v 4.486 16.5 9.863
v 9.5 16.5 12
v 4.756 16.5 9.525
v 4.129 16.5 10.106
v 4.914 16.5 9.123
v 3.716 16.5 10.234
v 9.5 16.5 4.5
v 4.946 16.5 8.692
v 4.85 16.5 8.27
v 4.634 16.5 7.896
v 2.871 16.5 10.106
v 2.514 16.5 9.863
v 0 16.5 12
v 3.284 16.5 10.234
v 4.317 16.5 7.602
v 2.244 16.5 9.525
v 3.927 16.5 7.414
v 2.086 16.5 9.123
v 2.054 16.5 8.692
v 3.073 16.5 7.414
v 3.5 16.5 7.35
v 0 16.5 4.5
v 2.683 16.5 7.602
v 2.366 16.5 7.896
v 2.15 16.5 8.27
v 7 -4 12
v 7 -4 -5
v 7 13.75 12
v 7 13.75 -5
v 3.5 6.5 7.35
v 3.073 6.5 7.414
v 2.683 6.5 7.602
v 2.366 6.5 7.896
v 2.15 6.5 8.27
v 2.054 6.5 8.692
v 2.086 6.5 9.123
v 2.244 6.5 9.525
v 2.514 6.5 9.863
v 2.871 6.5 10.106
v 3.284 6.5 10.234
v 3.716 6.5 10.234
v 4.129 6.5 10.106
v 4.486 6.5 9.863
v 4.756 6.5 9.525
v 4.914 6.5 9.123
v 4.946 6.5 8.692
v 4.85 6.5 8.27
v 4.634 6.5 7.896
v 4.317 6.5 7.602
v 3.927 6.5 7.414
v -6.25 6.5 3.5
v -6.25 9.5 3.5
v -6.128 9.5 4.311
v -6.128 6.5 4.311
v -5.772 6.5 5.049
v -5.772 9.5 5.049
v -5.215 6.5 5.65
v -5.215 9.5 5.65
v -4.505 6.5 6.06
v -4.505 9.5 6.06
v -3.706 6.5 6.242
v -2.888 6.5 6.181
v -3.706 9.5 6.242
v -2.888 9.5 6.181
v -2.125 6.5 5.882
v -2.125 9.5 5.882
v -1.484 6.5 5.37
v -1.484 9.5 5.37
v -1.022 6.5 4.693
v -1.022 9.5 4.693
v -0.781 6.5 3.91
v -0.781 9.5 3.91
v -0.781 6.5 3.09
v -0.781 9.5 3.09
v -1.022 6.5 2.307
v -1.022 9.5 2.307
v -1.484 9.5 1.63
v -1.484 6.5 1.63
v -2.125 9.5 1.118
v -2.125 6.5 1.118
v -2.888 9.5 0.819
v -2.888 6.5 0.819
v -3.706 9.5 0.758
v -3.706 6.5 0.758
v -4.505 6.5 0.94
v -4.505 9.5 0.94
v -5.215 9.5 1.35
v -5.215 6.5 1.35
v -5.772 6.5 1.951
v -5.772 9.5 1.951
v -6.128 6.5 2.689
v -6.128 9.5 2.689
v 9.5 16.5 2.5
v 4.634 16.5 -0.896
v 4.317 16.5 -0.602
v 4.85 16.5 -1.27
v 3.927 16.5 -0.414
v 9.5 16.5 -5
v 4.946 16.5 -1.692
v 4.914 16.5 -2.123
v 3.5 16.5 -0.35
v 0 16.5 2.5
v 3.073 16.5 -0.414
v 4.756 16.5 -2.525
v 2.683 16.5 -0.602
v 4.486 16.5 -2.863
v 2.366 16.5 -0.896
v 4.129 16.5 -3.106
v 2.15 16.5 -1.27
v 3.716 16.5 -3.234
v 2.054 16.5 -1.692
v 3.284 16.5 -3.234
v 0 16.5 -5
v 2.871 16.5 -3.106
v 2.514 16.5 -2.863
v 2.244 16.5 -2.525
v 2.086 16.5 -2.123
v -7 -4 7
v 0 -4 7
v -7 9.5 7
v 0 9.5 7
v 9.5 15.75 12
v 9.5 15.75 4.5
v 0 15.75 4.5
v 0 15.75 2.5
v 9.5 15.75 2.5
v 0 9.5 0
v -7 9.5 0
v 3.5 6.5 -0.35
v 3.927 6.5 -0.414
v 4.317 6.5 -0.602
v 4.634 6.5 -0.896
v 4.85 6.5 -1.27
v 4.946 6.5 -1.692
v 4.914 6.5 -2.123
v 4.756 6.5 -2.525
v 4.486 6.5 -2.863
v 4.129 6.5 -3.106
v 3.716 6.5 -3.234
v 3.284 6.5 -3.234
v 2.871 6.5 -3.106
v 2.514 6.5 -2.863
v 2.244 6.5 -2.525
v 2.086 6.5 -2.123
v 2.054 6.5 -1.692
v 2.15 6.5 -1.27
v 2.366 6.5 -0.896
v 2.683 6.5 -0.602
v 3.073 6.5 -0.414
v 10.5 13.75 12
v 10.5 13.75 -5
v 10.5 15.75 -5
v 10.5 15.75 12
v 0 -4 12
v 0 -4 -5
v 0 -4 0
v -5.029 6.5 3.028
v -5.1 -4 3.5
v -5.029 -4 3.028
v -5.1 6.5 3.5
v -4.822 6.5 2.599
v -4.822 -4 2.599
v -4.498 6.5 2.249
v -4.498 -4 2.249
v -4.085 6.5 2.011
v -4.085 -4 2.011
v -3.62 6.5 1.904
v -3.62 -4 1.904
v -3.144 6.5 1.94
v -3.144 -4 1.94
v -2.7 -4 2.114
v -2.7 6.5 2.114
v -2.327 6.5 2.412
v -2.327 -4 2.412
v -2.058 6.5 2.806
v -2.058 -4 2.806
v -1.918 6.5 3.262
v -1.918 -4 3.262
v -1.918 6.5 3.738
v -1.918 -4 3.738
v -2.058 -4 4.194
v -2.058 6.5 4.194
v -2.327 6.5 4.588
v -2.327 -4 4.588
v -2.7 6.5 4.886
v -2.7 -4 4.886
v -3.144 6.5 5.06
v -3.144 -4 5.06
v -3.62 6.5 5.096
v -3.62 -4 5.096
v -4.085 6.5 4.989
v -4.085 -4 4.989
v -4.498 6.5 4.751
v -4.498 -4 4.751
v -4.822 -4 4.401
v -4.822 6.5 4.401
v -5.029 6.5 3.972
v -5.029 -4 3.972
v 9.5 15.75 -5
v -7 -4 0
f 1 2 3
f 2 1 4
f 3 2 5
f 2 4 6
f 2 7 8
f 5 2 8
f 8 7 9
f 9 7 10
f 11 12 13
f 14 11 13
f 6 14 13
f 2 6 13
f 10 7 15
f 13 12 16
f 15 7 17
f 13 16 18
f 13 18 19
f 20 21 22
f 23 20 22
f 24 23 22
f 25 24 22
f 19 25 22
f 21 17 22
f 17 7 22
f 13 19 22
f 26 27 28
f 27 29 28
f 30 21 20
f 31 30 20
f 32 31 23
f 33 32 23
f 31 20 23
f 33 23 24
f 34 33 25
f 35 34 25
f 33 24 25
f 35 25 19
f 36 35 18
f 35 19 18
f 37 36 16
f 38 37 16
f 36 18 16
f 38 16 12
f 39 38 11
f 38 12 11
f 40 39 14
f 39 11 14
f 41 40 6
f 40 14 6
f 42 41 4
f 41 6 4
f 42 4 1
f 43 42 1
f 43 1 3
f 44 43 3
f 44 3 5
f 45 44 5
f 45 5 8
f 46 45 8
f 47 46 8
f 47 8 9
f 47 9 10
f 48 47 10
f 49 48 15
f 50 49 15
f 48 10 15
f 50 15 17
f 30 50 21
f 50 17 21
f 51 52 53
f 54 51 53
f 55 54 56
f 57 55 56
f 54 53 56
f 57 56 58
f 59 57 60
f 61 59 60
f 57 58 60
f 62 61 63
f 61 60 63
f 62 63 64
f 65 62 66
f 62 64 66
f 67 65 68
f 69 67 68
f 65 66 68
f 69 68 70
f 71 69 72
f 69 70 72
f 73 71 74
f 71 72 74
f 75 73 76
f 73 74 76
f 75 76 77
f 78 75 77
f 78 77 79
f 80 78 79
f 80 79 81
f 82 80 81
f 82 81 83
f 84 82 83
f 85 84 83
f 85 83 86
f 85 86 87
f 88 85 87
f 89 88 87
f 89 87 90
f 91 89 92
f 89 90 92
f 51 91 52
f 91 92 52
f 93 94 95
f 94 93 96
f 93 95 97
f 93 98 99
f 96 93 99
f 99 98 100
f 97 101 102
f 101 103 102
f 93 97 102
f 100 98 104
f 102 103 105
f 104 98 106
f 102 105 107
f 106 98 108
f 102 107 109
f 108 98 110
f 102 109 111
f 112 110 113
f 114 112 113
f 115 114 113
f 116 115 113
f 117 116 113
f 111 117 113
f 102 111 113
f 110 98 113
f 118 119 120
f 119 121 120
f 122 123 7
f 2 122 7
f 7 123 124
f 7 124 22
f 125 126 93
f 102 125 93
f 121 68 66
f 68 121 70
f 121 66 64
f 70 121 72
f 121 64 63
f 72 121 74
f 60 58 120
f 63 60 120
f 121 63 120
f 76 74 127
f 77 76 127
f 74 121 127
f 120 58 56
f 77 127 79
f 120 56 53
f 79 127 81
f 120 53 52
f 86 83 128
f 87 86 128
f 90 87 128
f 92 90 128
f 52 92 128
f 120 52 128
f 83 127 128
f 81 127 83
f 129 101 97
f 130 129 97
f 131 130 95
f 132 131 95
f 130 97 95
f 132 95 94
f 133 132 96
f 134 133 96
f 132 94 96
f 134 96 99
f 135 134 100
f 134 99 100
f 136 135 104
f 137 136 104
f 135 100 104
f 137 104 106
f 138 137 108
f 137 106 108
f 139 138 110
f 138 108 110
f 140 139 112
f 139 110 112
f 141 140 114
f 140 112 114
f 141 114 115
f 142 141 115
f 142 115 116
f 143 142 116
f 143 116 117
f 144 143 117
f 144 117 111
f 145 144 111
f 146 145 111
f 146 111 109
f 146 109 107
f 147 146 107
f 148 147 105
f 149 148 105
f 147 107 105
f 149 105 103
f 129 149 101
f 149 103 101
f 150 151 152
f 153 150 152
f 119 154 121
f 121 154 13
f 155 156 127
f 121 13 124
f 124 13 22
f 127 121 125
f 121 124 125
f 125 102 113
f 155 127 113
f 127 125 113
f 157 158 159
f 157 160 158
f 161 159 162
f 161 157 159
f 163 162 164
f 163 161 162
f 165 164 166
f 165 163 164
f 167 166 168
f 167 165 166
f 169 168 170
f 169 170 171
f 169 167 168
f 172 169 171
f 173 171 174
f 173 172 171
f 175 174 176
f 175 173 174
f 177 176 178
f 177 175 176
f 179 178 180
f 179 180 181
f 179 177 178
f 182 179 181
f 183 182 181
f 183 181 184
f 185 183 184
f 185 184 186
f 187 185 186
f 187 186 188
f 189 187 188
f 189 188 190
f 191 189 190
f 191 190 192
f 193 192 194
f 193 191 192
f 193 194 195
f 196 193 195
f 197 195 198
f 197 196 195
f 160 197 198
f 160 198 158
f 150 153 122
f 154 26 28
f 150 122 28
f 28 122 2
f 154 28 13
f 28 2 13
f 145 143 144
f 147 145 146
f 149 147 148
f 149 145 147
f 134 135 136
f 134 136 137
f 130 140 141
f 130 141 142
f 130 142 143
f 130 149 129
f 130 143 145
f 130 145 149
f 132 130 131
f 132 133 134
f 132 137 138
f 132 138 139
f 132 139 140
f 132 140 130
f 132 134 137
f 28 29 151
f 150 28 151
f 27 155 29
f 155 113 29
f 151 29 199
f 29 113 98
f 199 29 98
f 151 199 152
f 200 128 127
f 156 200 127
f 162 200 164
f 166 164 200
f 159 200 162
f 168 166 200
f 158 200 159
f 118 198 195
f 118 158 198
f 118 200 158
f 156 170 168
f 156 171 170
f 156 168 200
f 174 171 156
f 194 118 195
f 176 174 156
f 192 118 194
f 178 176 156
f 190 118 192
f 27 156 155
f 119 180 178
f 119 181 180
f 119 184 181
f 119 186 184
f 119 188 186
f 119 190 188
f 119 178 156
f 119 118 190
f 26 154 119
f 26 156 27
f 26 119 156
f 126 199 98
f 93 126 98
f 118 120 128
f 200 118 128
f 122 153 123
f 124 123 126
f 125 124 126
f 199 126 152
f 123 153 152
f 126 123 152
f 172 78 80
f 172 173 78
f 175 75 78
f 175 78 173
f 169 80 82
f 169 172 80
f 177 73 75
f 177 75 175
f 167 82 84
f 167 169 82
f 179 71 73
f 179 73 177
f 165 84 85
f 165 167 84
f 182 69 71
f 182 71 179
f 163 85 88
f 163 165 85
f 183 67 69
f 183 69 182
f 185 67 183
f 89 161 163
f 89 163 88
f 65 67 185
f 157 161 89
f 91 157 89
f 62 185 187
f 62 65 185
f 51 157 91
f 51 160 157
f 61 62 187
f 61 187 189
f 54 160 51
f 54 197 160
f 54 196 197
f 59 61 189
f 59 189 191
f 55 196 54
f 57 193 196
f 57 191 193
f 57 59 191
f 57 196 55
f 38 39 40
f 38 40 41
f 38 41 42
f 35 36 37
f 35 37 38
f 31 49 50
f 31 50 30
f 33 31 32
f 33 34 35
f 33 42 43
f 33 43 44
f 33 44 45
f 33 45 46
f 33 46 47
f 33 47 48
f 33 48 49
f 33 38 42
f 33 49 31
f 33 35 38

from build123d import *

# Parameters (mm, degrees)
SALIENTE_EXTRUIR1_DEPTH      = 7
CROQUIS5_R                   = 1.6
CORTAR_EXTRUIR2_DEPTH        = 13.9
CROQUIS6_R                   = 2.75
CORTAR_EXTRUIR3_DEPTH        = 3
SALIENTE_EXTRUIR2_DEPTH      = 5
SALIENTE_EXTRUIR2_DEPTH_BACK = 12
CROQUIS8_R                   = 1.45
CORTAR_EXTRUIR4_DEPTH        = 10
CROQUIS9_W                   = 2
CROQUIS9_H                   = 0.75
CORTAR_EXTRUIR5_DEPTH        = 10
CROQUIS10_R                  = 1.6
SALIENTE_EXTRUIR3_DEPTH      = 4


with BuildPart() as part:
    # Croquis1 → Saliente-Extruir1 (new body)
    with BuildSketch(Plane.XY):
        Polygon((0, 0), (4, 0), (4, -4), (7, -4), (7, 0), (7, 13.75), (10.5, 13.75), (10.5, 15.75), (9.5, 15.75), (9.5, 16.5), (7, 16.5), (0, 16.5), (0, 9.5), (-7, 9.5), (-7, 0), align=None)
    extrude(amount=SALIENTE_EXTRUIR1_DEPTH)

    # Croquis5 → Cortar-Extruir2 (cut)
    with BuildSketch(Plane(origin=(0, 9.5, 0), x_dir=(1, 0, 0), z_dir=(0, 1, 0))):
        with Locations(Location((-3.5, -3.5, 0), (0, 0, 180))):
            Circle(CROQUIS5_R)
    extrude(amount=-CORTAR_EXTRUIR2_DEPTH, mode=Mode.SUBTRACT)

    # Croquis6 → Cortar-Extruir3 (cut)
    with BuildSketch(Plane(origin=(0, 9.5, 0), x_dir=(1, 0, 0), z_dir=(0, 1, 0))):
        with Locations(Location((-3.5, -3.5, 0), (0, 0, 180))):
            Circle(CROQUIS6_R)
    extrude(amount=-CORTAR_EXTRUIR3_DEPTH, mode=Mode.SUBTRACT)

    # Croquis7 → Saliente-Extruir2 (add, two sides: drawn at the far end of the back side and taken through both)
    with BuildSketch(Plane.XY.offset(7).offset(-SALIENTE_EXTRUIR2_DEPTH_BACK)):
        Polygon((0, 16.5), (0, 0), (7, 0), (7, 13.75), (10.5, 13.75), (10.5, 15.75), (9.5, 15.75), (9.5, 16.5), align=None)
    extrude(amount=SALIENTE_EXTRUIR2_DEPTH + SALIENTE_EXTRUIR2_DEPTH_BACK)

    # Croquis8 → Cortar-Extruir4 (cut)
    with BuildSketch(Plane(origin=(0, 16.5, 0), x_dir=(1, 0, 0), z_dir=(0, 1, 0))):
        with Locations(Location((3.5, 1.8, 0), (0, 0, 270))):
            Circle(CROQUIS8_R)
        with Locations(Location((3.5, -8.8, 0), (0, 0, 90))):
            Circle(CROQUIS8_R)
    extrude(amount=-CORTAR_EXTRUIR4_DEPTH, mode=Mode.SUBTRACT)

    # Croquis9 → Cortar-Extruir5 (cut)
    with BuildSketch(Plane(origin=(9.5, 0, 0), x_dir=(0, 0, -1), z_dir=(1, 0, 0))):
        with Locations((-3.5, 16.125)):
            Rectangle(CROQUIS9_W, CROQUIS9_H)
    extrude(amount=-CORTAR_EXTRUIR5_DEPTH, mode=Mode.SUBTRACT)

    # Croquis10 → Saliente-Extruir3 (add)
    with BuildSketch(Plane.XZ):
        Polygon((-7, 0), (0, 0), (0, -5), (7, -5), (7, 0), (4, 0), (4, 7), (7, 7), (7, 12), (0, 12), (0, 7), (-7, 7), align=None)
        with Locations(Location((-3.5, 3.5, 0), (0, 0, 180))):
            Circle(CROQUIS10_R, mode=Mode.SUBTRACT)
    extrude(amount=SALIENTE_EXTRUIR3_DEPTH)


solid = part.part
